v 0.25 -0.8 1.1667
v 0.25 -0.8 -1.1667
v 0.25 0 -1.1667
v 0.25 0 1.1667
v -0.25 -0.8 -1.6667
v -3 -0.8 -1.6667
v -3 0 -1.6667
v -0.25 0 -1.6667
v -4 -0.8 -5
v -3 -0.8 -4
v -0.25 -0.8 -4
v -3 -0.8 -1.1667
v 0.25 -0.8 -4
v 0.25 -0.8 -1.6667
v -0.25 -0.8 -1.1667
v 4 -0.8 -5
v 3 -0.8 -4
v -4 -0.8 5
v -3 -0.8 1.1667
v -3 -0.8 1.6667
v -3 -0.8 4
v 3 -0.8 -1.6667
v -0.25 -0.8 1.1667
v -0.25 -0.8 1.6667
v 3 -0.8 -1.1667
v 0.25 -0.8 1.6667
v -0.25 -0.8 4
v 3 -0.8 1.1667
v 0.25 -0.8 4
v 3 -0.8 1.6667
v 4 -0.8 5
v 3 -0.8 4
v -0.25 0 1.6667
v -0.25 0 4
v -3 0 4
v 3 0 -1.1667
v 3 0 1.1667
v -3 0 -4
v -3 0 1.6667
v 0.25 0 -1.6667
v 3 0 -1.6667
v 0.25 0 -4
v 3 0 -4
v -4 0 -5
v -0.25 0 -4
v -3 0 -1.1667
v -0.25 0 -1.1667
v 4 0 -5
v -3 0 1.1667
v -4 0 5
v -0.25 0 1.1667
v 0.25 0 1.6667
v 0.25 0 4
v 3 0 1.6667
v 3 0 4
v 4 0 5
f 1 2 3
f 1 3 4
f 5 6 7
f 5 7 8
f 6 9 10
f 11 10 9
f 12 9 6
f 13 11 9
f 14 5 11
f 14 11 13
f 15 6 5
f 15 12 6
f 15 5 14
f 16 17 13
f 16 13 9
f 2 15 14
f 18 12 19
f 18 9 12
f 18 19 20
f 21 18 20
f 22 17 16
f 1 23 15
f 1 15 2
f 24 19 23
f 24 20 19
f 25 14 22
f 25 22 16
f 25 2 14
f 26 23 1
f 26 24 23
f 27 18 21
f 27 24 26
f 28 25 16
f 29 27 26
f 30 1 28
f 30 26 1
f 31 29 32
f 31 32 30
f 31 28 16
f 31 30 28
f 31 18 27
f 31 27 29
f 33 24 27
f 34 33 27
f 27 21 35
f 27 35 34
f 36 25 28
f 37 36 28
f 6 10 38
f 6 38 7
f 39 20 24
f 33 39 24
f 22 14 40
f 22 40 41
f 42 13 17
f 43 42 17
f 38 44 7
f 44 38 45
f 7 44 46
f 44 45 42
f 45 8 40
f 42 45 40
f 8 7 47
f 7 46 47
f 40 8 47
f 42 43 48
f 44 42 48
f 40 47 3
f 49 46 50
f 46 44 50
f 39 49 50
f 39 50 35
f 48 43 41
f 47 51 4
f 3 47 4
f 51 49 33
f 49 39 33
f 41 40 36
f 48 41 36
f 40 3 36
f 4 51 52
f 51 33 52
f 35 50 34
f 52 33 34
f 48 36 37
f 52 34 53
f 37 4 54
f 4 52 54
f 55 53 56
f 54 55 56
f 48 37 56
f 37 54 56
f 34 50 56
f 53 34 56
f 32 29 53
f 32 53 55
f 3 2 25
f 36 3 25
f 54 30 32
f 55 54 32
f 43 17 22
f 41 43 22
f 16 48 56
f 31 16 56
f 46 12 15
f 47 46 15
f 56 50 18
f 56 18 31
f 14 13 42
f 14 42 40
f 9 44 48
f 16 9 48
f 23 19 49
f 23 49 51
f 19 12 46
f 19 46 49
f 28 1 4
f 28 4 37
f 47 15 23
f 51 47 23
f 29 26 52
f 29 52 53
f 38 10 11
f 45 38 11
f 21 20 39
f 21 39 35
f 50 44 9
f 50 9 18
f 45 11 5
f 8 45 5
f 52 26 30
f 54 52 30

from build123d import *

# Parameters (mm, degrees)
SKETCH_W      = 8
SKETCH_H      = 10
PAD_DEPTH     = 0.8
SKETCH001_W   = 2.75
SKETCH001_H   = 2.333333
SKETCH001_H_2 = 2.333334
POCKET_DEPTH  = 5


with BuildPart() as part:
    # Sketch → Pad (new body)
    with BuildSketch(Plane.XZ):
        Rectangle(SKETCH_W, SKETCH_H)
    extrude(amount=PAD_DEPTH)

    # Sketch001 (on Face6 of Pad) → Pocket (cut)
    with BuildSketch(Plane.XZ.offset(0.8)):
        with Locations((-1.625, 2.833334)):
            Rectangle(SKETCH001_W, SKETCH001_H)
        with Locations((-1.625, 0)):
            Rectangle(SKETCH001_W, SKETCH001_H_2)
        with Locations((-1.625, -2.833334)):
            Rectangle(SKETCH001_W, SKETCH001_H)
        with Locations((1.625, 2.833334)):
            Rectangle(SKETCH001_W, SKETCH001_H)
        with Locations((1.625, 0)):
            Rectangle(SKETCH001_W, SKETCH001_H_2)
        with Locations((1.625, -2.833334)):
            Rectangle(SKETCH001_W, SKETCH001_H)
    extrude(amount=-POCKET_DEPTH, mode=Mode.SUBTRACT)


solid = part.part
